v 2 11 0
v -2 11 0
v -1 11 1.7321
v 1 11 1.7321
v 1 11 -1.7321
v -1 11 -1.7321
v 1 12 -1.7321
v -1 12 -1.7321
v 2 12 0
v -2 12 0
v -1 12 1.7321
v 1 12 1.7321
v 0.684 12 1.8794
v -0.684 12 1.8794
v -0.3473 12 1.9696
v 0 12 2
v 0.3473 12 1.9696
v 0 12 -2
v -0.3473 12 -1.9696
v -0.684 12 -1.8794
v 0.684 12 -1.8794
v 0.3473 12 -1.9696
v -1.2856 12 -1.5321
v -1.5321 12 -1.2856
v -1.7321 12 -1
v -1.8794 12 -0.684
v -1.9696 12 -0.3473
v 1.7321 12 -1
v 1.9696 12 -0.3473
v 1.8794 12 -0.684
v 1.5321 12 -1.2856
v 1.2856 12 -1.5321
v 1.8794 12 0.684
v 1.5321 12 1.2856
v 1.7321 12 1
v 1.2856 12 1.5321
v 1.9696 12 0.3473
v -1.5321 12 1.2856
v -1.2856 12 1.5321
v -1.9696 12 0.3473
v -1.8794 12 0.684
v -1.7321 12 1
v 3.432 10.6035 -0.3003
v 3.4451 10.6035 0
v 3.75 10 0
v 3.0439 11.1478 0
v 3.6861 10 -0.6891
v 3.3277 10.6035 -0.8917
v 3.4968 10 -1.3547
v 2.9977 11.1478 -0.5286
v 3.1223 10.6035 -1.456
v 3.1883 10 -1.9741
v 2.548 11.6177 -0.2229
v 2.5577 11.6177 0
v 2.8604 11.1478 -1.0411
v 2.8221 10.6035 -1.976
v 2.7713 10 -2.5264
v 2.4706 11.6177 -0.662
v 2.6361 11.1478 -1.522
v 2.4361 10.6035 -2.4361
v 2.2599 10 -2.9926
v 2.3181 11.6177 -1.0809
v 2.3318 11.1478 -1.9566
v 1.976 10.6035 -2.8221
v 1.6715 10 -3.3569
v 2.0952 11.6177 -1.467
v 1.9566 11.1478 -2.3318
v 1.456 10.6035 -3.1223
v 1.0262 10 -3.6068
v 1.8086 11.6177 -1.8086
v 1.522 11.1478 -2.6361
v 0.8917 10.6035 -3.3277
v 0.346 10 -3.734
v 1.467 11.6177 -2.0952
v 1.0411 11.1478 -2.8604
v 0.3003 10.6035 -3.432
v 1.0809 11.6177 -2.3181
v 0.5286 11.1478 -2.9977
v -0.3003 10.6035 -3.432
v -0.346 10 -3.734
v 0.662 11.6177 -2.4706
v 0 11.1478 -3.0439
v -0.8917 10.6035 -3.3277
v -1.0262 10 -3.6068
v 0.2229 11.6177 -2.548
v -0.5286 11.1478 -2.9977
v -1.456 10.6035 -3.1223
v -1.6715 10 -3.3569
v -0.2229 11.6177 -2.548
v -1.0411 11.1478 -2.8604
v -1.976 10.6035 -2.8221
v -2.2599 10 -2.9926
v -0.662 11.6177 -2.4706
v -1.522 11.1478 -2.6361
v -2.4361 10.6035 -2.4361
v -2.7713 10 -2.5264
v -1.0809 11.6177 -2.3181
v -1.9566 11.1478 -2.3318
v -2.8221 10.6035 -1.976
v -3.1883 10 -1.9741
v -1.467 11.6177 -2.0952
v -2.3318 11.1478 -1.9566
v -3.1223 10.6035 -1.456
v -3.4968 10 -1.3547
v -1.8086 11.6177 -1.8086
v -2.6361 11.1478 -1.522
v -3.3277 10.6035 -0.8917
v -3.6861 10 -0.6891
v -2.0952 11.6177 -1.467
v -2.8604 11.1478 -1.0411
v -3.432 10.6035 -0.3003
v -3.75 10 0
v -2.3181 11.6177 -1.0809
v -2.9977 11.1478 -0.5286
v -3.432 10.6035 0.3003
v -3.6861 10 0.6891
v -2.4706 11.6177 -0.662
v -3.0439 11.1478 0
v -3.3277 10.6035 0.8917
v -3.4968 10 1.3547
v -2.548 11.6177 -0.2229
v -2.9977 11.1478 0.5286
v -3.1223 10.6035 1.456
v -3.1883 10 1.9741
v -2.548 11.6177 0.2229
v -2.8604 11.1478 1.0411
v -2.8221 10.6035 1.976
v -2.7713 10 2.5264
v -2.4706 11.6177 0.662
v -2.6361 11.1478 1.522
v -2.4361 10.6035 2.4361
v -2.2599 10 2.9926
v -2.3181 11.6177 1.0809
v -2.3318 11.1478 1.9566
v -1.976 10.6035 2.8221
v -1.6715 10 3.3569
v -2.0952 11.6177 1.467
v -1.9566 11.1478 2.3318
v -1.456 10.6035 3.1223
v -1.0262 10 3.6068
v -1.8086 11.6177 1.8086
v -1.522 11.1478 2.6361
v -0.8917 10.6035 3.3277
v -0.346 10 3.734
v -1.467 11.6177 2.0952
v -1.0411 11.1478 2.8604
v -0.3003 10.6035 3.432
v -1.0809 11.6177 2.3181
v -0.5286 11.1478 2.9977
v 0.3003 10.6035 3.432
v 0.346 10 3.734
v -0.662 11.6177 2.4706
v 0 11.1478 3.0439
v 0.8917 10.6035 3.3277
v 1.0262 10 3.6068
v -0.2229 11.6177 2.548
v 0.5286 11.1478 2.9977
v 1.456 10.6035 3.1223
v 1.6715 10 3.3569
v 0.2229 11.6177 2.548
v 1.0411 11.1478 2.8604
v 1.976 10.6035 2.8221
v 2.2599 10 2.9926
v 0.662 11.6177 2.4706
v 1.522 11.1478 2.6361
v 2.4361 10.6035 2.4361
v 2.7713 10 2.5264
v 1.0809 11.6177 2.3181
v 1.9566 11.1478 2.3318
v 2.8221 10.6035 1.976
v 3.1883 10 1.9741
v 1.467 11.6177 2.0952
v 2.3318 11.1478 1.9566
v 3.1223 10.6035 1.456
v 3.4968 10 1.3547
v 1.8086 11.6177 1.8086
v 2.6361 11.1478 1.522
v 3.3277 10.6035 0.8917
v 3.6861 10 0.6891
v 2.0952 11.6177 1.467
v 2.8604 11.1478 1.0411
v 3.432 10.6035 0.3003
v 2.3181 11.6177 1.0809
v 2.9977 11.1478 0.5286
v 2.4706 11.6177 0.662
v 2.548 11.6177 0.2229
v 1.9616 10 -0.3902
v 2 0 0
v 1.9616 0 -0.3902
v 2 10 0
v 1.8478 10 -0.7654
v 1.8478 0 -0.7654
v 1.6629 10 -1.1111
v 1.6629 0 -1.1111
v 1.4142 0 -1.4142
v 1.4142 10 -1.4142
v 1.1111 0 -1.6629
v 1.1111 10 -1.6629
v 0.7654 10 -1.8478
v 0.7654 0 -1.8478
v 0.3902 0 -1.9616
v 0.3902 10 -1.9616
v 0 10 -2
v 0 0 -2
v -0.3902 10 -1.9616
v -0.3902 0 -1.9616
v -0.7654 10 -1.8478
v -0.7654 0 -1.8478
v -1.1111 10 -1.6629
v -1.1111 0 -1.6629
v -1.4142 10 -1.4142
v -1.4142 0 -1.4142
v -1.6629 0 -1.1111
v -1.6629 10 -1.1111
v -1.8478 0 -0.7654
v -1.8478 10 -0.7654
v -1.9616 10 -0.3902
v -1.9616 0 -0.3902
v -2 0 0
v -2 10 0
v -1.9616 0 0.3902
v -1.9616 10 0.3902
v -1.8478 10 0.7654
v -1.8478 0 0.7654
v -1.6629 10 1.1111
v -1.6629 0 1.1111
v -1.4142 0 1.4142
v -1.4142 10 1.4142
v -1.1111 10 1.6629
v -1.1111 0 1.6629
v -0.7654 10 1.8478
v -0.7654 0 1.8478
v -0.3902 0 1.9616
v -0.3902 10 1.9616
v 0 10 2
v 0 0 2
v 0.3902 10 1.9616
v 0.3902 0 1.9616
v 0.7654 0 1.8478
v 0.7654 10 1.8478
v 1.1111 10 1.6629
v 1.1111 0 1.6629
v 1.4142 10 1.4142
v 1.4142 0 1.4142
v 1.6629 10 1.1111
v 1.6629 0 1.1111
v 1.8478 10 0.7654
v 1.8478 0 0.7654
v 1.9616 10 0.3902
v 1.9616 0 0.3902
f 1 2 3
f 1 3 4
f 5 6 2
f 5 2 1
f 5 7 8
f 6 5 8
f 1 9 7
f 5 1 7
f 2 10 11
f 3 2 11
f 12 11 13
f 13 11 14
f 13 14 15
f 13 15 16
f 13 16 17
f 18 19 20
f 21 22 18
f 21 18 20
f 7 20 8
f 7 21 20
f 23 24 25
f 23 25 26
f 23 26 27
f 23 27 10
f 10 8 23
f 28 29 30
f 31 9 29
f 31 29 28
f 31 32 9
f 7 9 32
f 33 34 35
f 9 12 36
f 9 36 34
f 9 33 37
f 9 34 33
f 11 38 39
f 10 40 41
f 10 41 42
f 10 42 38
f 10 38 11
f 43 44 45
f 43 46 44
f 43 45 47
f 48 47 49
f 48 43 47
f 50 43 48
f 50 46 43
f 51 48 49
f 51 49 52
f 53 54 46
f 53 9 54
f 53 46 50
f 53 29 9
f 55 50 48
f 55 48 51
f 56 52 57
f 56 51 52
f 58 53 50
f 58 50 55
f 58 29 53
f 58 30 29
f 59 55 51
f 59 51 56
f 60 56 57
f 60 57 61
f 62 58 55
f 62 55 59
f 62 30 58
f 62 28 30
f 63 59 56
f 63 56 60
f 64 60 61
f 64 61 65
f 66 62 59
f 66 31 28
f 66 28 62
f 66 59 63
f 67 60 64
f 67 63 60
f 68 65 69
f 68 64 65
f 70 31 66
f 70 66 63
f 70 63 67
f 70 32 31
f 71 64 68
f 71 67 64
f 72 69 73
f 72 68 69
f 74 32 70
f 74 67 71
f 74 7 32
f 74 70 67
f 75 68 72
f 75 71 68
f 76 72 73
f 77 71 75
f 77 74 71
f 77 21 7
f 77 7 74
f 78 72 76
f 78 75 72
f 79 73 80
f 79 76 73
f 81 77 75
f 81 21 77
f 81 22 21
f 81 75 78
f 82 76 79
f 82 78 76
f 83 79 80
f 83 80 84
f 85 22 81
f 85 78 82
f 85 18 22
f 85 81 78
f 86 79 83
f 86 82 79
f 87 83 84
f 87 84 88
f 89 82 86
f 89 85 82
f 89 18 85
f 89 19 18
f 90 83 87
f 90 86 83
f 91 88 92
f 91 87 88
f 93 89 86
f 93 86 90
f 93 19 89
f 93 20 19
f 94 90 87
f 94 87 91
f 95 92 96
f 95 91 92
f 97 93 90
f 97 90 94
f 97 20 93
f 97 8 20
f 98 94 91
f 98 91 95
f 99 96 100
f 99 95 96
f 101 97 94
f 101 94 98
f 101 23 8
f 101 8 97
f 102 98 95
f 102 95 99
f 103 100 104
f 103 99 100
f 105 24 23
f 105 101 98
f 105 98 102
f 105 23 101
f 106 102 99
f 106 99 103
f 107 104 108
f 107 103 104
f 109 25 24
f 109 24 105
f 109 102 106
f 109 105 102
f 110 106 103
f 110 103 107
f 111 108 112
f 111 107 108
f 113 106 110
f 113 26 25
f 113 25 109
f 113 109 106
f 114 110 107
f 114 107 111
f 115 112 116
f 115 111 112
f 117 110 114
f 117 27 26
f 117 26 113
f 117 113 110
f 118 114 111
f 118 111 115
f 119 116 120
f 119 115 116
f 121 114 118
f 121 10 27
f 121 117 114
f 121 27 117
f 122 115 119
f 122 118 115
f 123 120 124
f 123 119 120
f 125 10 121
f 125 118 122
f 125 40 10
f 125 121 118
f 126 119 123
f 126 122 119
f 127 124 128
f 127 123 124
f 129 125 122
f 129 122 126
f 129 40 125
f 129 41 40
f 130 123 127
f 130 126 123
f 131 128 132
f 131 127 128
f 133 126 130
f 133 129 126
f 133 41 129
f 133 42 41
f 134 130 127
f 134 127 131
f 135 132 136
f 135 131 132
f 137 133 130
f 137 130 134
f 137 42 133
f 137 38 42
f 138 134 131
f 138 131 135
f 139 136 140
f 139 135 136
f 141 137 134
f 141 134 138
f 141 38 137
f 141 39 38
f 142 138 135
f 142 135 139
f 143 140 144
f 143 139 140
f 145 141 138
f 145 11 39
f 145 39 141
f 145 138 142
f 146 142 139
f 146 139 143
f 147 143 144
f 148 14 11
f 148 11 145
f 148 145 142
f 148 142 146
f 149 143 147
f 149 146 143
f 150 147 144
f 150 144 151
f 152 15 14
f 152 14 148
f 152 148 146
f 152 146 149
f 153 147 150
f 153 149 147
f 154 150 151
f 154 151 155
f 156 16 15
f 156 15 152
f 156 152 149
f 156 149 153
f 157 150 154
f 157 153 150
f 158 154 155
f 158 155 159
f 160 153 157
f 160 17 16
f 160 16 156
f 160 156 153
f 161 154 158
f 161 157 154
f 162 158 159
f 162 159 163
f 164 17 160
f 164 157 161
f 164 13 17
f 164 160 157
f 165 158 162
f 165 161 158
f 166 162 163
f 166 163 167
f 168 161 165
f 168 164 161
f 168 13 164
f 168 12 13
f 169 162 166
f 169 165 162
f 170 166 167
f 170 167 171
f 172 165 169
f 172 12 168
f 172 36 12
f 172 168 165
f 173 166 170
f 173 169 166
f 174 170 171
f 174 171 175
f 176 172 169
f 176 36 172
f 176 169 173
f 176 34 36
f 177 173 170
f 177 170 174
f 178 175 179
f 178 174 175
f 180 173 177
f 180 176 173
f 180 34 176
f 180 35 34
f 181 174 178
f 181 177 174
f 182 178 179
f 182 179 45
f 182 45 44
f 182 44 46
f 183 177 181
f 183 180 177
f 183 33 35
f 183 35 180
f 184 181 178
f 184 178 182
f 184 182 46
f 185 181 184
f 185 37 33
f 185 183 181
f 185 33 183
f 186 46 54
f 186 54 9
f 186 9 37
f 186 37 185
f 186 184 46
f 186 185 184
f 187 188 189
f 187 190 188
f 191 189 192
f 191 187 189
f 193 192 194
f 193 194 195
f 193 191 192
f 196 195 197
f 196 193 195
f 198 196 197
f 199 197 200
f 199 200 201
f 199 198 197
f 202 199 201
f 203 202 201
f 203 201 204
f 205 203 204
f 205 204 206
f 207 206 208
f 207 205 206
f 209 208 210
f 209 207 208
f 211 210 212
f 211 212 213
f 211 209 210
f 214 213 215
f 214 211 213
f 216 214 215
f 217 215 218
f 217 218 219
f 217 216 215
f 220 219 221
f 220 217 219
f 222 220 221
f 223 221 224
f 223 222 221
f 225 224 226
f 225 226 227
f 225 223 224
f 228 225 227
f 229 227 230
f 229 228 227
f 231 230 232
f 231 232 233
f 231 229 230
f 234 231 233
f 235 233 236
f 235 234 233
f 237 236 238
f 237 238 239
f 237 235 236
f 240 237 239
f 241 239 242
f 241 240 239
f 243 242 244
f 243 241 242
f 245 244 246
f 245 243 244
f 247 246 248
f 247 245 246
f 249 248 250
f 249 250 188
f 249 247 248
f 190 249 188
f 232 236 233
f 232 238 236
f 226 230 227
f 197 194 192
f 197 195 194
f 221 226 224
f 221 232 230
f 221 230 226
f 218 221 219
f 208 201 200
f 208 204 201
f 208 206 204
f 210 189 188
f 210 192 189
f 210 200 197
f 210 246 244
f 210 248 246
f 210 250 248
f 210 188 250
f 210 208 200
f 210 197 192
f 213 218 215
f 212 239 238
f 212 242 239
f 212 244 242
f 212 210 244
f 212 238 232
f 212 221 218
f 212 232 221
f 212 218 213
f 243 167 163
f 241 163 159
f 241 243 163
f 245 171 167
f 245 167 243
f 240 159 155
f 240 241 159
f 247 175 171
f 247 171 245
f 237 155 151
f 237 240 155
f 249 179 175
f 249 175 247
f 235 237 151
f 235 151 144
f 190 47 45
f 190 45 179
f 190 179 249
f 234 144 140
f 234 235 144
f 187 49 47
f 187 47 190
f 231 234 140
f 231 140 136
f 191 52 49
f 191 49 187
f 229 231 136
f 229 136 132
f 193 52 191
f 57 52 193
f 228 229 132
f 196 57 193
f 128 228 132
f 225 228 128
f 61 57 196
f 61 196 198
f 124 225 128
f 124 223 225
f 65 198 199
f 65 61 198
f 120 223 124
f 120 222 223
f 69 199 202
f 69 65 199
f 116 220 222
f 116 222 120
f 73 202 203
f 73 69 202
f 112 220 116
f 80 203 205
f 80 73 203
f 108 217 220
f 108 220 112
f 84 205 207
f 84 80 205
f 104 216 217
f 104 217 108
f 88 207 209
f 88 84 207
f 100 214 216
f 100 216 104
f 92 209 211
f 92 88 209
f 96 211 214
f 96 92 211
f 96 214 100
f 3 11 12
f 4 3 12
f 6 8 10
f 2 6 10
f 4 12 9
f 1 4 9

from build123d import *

# Parameters (mm, degrees)
CUT_EXTRUDE1_DEPTH = 1


with BuildPart() as part:
    # Sketch1 → Revolve1 (revolve)
    with BuildSketch(Plane.XY):
        with BuildLine():
            Line((0, 0), (2, 0))
            Line((2, 0), (2, 10))
            Line((2, 10), (3.75, 10))
            ThreePointArc((3.75, 10), (3.043948915, 11.147830301), (2, 12))
            Line((2, 12), (0, 12))
            Line((0, 12), (0, 0))
        make_face()
    revolve(axis=Axis((0, -310.205901947, 0), (0, 1, 0)))

    # Sketch2 → Cut-Extrude1 (cut)
    with BuildSketch(Plane(origin=(0, 12, 0), x_dir=(1, 0, 0), z_dir=(0, 1, 0))):
        Polygon((2, 0), (1, 1.732050808), (-1, 1.732050808), (-2, 0), (-1, -1.732050808), (1, -1.732050808), align=None)
    extrude(amount=-CUT_EXTRUDE1_DEPTH, mode=Mode.SUBTRACT)


solid = part.part
